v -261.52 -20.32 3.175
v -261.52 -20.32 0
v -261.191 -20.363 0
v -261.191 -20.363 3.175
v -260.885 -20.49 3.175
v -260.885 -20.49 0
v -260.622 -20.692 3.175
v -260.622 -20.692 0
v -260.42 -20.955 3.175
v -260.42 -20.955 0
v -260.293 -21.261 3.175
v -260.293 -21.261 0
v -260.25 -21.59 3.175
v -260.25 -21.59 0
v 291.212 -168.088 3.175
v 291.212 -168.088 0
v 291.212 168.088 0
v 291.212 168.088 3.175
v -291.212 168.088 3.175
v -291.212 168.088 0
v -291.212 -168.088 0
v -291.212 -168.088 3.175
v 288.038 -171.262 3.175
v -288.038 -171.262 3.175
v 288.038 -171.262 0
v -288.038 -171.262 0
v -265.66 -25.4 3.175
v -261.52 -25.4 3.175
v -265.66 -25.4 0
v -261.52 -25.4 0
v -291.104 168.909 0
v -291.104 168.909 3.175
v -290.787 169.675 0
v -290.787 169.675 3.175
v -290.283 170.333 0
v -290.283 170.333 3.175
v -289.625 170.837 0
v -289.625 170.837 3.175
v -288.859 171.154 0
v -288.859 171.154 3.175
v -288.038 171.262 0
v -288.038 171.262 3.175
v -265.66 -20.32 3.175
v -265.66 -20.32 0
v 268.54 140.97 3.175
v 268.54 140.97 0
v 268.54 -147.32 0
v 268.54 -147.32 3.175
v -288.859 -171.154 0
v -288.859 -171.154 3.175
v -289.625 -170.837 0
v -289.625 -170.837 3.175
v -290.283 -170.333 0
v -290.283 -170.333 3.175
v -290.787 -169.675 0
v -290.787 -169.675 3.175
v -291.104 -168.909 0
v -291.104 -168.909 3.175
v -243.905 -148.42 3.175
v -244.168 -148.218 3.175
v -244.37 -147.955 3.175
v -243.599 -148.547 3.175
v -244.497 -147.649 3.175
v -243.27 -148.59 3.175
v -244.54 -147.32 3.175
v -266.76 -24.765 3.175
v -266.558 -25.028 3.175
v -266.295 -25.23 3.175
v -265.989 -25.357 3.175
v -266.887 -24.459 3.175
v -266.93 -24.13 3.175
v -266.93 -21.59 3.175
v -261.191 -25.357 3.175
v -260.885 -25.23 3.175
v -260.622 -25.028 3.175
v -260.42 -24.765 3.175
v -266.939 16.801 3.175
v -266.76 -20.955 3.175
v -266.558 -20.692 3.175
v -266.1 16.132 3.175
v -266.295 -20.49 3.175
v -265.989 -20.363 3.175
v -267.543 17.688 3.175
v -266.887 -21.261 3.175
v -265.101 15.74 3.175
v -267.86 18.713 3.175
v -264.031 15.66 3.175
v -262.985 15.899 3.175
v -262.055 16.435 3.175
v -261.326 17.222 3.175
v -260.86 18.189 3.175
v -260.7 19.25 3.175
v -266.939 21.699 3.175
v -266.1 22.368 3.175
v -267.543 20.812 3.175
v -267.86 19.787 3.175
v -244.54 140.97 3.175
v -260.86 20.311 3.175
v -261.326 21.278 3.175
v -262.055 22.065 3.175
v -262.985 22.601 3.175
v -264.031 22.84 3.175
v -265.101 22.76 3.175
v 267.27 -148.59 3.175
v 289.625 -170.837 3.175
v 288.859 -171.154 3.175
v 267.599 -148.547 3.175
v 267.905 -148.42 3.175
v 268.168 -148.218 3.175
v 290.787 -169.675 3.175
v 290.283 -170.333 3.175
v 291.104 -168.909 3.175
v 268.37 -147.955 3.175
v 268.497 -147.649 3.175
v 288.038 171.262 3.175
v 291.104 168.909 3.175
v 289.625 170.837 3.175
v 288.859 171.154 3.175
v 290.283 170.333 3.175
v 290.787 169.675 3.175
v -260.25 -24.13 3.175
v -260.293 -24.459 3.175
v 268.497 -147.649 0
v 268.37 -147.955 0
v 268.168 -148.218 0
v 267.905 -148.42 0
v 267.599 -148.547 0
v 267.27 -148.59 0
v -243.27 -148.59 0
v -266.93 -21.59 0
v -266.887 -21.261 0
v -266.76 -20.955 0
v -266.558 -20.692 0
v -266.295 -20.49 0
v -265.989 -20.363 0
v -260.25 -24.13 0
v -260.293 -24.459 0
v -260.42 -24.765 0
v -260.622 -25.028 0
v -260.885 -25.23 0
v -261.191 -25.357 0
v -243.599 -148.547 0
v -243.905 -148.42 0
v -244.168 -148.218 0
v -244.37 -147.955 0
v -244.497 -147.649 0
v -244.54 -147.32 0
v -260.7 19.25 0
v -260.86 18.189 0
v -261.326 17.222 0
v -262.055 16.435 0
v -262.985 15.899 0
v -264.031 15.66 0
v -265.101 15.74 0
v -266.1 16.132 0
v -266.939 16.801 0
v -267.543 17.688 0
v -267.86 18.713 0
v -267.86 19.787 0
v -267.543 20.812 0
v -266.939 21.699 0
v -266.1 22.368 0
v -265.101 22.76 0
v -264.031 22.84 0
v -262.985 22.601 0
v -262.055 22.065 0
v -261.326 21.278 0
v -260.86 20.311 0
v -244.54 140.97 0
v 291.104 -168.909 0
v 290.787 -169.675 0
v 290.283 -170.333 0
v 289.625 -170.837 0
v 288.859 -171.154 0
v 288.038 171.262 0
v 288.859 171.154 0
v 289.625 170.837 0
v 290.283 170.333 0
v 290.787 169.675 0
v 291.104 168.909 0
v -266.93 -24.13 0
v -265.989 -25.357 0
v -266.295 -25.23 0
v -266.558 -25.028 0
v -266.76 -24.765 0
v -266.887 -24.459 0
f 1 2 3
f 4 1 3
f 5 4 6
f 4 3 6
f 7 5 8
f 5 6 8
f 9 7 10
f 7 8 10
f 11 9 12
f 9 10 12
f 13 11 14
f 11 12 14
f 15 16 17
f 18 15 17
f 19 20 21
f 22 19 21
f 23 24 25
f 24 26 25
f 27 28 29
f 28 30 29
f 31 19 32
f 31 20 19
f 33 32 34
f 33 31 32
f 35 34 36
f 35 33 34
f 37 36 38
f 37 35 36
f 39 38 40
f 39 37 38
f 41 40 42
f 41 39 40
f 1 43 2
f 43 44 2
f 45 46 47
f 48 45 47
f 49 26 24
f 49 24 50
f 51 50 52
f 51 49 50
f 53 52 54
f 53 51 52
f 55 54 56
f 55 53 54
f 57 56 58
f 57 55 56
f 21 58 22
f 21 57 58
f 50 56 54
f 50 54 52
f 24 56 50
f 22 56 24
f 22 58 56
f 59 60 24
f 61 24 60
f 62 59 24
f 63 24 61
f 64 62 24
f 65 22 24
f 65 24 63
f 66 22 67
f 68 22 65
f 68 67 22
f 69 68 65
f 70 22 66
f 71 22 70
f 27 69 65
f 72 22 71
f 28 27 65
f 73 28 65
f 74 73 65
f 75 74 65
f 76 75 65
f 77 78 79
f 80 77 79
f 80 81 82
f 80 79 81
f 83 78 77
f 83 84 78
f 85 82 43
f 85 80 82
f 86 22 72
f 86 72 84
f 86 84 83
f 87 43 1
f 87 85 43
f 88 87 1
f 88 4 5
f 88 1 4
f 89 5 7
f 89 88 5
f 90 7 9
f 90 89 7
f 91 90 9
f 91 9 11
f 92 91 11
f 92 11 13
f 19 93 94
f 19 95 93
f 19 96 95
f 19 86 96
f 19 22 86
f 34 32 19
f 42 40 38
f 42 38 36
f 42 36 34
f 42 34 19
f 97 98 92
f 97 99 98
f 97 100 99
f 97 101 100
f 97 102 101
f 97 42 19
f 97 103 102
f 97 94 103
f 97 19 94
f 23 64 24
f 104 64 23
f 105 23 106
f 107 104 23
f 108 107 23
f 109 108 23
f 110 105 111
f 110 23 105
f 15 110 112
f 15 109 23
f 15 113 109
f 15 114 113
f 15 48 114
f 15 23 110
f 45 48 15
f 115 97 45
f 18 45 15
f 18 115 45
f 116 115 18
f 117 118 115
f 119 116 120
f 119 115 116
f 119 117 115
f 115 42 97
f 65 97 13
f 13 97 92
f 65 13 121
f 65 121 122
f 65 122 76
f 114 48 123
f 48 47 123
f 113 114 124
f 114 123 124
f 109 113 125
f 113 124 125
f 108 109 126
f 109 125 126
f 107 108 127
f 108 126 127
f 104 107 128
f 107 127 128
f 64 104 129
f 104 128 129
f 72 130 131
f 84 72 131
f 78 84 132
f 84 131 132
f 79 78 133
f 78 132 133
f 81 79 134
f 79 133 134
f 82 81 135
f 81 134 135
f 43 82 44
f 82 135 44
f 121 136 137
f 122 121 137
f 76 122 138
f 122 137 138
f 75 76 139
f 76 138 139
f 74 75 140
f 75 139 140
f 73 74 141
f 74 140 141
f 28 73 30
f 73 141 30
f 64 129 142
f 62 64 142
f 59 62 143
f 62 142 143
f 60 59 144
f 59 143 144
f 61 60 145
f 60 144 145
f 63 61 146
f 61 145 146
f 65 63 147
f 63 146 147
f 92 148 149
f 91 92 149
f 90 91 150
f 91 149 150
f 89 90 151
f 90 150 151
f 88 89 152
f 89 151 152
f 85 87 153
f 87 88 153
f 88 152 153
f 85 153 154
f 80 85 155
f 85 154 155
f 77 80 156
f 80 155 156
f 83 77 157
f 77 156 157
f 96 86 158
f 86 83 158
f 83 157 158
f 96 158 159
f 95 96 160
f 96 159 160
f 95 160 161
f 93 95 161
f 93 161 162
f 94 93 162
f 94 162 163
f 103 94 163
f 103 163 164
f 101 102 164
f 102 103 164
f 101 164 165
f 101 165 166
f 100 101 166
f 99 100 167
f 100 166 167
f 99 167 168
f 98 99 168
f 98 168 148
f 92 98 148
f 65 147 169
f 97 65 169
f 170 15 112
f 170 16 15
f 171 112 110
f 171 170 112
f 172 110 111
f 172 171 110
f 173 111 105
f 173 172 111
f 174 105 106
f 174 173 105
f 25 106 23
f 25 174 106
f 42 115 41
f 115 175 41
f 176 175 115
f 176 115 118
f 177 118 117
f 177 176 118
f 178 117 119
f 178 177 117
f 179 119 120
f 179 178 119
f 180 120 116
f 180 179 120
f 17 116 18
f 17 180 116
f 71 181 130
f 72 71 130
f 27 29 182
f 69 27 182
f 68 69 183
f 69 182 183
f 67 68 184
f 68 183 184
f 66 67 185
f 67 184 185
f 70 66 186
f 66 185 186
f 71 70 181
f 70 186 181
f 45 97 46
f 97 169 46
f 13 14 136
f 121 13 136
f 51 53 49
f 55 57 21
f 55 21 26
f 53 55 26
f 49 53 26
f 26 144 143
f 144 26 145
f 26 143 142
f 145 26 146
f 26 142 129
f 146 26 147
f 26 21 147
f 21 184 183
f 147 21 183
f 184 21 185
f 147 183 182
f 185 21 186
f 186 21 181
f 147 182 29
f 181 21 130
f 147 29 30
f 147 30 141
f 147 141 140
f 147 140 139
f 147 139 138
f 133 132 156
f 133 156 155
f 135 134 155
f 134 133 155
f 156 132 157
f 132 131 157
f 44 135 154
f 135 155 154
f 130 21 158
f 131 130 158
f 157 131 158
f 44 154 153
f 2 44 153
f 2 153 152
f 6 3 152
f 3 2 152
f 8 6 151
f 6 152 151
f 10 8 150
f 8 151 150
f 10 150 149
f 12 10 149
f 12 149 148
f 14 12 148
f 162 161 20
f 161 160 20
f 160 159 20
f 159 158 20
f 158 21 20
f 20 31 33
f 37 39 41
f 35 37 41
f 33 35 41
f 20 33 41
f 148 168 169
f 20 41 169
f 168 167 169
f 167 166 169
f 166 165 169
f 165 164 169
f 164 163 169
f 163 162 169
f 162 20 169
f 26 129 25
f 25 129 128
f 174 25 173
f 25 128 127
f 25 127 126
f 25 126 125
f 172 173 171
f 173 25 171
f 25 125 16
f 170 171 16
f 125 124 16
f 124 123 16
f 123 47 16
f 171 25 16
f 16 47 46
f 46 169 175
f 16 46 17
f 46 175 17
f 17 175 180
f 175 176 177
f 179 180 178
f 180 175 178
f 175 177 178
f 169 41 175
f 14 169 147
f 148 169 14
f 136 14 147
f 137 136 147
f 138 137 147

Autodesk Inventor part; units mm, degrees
ref_plane "YZ Plane" through (0, 0, 0) normal (1, 0, 0) x (0, 1, 0)
ref_plane "XZ Plane" through (0, 0, 0) normal (0, 1, 0) x (-1, 0, 0)
ref_plane "XY Plane" through (0, 0, 0) normal (0, 0, 1) x (1, 0, 0)
ref_plane "Work Plane1" through (0, 0, 0) normal (0, 0, 1) x (1, 0, 0)
sketch "Sketch1" plane through (0, 0, 0) normal (0, 0, 1) x (1, 0, 0)
  arc A0 (-261.52, -25.4) -> (-260.25, -24.13) centre (-261.52, -24.13) ccw projected
  line L0 (-261.52, -25.4) -> (-265.66, -25.4) projected
  arc A1 (-266.93, -24.13) -> (-265.66, -25.4) centre (-265.66, -24.13) ccw projected
  line L1 (-266.93, -24.13) -> (-266.93, -21.59) projected
  arc A2 (-265.66, -20.32) -> (-266.93, -21.59) centre (-265.66, -21.59) ccw projected
  line L2 (-265.66, -20.32) -> (-261.52, -20.32) projected
  arc A3 (-260.25, -21.59) -> (-261.52, -20.32) centre (-261.52, -21.59) ccw projected
  line L3 (-260.25, -21.59) -> (-260.25, -24.13) projected
  circle A4 centre (-264.3, 19.25) radius 3.6 projected
  arc A5 (291.2125, 168.0875) -> (288.0375, 171.2625) centre (288.0375, 168.0875) ccw projected
  line L4 (288.0375, 171.2625) -> (-288.0375, 171.2625) projected
  arc A6 (-288.0375, 171.2625) -> (-291.2125, 168.0875) centre (-288.0375, 168.0875) ccw projected
  line L5 (-291.2125, 168.0875) -> (-291.2125, -168.0875) projected
  arc A7 (-291.2125, -168.0875) -> (-288.0375, -171.2625) centre (-288.0375, -168.0875) ccw projected
  line L6 (-288.0375, -171.2625) -> (288.0375, -171.2625) projected
  arc A8 (288.0375, -171.2625) -> (291.2125, -168.0875) centre (288.0375, -168.0875) ccw projected
  line L7 (291.2125, -168.0875) -> (291.2125, 168.0875) projected
  point P0 (0, 0)
extrude "Extrusion1" add sketch "Sketch1" along normal blind 3.175
sketch "Sketch2" plane through (0, 0, 0) normal (0, 0, 1) x (1, 0, 0)
  arc A0 (267.27, -148.59) -> (268.54, -147.32) centre (267.27, -147.32) ccw projected
  line L0 (268.54, 140.97) -> (268.54, -147.32) projected
  line L1 (-244.54, 140.97) -> (268.54, 140.97) projected
  line L2 (-244.54, -147.32) -> (-244.54, 140.97) projected
  arc A1 (-244.54, -147.32) -> (-243.27, -148.59) centre (-243.27, -147.32) ccw projected
  line L3 (267.27, -148.59) -> (-243.27, -148.59) projected
  arc A2 (267.27, -148.59) -> (268.54, -147.32) centre (267.27, -147.32) ccw projected
  line L4 (268.54, 140.97) -> (268.54, -147.32) projected
  line L5 (-244.54, 140.97) -> (268.54, 140.97) projected
  line L6 (-244.54, -147.32) -> (-244.54, 140.97) projected
  arc A3 (-244.54, -147.32) -> (-243.27, -148.59) centre (-243.27, -147.32) ccw projected
  line L7 (267.27, -148.59) -> (-243.27, -148.59) projected
  point P0 (0, 0)
extrude "Extrusion2" cut sketch "Sketch2" along normal blind 3.175
properties material "Wood (Birch)"
